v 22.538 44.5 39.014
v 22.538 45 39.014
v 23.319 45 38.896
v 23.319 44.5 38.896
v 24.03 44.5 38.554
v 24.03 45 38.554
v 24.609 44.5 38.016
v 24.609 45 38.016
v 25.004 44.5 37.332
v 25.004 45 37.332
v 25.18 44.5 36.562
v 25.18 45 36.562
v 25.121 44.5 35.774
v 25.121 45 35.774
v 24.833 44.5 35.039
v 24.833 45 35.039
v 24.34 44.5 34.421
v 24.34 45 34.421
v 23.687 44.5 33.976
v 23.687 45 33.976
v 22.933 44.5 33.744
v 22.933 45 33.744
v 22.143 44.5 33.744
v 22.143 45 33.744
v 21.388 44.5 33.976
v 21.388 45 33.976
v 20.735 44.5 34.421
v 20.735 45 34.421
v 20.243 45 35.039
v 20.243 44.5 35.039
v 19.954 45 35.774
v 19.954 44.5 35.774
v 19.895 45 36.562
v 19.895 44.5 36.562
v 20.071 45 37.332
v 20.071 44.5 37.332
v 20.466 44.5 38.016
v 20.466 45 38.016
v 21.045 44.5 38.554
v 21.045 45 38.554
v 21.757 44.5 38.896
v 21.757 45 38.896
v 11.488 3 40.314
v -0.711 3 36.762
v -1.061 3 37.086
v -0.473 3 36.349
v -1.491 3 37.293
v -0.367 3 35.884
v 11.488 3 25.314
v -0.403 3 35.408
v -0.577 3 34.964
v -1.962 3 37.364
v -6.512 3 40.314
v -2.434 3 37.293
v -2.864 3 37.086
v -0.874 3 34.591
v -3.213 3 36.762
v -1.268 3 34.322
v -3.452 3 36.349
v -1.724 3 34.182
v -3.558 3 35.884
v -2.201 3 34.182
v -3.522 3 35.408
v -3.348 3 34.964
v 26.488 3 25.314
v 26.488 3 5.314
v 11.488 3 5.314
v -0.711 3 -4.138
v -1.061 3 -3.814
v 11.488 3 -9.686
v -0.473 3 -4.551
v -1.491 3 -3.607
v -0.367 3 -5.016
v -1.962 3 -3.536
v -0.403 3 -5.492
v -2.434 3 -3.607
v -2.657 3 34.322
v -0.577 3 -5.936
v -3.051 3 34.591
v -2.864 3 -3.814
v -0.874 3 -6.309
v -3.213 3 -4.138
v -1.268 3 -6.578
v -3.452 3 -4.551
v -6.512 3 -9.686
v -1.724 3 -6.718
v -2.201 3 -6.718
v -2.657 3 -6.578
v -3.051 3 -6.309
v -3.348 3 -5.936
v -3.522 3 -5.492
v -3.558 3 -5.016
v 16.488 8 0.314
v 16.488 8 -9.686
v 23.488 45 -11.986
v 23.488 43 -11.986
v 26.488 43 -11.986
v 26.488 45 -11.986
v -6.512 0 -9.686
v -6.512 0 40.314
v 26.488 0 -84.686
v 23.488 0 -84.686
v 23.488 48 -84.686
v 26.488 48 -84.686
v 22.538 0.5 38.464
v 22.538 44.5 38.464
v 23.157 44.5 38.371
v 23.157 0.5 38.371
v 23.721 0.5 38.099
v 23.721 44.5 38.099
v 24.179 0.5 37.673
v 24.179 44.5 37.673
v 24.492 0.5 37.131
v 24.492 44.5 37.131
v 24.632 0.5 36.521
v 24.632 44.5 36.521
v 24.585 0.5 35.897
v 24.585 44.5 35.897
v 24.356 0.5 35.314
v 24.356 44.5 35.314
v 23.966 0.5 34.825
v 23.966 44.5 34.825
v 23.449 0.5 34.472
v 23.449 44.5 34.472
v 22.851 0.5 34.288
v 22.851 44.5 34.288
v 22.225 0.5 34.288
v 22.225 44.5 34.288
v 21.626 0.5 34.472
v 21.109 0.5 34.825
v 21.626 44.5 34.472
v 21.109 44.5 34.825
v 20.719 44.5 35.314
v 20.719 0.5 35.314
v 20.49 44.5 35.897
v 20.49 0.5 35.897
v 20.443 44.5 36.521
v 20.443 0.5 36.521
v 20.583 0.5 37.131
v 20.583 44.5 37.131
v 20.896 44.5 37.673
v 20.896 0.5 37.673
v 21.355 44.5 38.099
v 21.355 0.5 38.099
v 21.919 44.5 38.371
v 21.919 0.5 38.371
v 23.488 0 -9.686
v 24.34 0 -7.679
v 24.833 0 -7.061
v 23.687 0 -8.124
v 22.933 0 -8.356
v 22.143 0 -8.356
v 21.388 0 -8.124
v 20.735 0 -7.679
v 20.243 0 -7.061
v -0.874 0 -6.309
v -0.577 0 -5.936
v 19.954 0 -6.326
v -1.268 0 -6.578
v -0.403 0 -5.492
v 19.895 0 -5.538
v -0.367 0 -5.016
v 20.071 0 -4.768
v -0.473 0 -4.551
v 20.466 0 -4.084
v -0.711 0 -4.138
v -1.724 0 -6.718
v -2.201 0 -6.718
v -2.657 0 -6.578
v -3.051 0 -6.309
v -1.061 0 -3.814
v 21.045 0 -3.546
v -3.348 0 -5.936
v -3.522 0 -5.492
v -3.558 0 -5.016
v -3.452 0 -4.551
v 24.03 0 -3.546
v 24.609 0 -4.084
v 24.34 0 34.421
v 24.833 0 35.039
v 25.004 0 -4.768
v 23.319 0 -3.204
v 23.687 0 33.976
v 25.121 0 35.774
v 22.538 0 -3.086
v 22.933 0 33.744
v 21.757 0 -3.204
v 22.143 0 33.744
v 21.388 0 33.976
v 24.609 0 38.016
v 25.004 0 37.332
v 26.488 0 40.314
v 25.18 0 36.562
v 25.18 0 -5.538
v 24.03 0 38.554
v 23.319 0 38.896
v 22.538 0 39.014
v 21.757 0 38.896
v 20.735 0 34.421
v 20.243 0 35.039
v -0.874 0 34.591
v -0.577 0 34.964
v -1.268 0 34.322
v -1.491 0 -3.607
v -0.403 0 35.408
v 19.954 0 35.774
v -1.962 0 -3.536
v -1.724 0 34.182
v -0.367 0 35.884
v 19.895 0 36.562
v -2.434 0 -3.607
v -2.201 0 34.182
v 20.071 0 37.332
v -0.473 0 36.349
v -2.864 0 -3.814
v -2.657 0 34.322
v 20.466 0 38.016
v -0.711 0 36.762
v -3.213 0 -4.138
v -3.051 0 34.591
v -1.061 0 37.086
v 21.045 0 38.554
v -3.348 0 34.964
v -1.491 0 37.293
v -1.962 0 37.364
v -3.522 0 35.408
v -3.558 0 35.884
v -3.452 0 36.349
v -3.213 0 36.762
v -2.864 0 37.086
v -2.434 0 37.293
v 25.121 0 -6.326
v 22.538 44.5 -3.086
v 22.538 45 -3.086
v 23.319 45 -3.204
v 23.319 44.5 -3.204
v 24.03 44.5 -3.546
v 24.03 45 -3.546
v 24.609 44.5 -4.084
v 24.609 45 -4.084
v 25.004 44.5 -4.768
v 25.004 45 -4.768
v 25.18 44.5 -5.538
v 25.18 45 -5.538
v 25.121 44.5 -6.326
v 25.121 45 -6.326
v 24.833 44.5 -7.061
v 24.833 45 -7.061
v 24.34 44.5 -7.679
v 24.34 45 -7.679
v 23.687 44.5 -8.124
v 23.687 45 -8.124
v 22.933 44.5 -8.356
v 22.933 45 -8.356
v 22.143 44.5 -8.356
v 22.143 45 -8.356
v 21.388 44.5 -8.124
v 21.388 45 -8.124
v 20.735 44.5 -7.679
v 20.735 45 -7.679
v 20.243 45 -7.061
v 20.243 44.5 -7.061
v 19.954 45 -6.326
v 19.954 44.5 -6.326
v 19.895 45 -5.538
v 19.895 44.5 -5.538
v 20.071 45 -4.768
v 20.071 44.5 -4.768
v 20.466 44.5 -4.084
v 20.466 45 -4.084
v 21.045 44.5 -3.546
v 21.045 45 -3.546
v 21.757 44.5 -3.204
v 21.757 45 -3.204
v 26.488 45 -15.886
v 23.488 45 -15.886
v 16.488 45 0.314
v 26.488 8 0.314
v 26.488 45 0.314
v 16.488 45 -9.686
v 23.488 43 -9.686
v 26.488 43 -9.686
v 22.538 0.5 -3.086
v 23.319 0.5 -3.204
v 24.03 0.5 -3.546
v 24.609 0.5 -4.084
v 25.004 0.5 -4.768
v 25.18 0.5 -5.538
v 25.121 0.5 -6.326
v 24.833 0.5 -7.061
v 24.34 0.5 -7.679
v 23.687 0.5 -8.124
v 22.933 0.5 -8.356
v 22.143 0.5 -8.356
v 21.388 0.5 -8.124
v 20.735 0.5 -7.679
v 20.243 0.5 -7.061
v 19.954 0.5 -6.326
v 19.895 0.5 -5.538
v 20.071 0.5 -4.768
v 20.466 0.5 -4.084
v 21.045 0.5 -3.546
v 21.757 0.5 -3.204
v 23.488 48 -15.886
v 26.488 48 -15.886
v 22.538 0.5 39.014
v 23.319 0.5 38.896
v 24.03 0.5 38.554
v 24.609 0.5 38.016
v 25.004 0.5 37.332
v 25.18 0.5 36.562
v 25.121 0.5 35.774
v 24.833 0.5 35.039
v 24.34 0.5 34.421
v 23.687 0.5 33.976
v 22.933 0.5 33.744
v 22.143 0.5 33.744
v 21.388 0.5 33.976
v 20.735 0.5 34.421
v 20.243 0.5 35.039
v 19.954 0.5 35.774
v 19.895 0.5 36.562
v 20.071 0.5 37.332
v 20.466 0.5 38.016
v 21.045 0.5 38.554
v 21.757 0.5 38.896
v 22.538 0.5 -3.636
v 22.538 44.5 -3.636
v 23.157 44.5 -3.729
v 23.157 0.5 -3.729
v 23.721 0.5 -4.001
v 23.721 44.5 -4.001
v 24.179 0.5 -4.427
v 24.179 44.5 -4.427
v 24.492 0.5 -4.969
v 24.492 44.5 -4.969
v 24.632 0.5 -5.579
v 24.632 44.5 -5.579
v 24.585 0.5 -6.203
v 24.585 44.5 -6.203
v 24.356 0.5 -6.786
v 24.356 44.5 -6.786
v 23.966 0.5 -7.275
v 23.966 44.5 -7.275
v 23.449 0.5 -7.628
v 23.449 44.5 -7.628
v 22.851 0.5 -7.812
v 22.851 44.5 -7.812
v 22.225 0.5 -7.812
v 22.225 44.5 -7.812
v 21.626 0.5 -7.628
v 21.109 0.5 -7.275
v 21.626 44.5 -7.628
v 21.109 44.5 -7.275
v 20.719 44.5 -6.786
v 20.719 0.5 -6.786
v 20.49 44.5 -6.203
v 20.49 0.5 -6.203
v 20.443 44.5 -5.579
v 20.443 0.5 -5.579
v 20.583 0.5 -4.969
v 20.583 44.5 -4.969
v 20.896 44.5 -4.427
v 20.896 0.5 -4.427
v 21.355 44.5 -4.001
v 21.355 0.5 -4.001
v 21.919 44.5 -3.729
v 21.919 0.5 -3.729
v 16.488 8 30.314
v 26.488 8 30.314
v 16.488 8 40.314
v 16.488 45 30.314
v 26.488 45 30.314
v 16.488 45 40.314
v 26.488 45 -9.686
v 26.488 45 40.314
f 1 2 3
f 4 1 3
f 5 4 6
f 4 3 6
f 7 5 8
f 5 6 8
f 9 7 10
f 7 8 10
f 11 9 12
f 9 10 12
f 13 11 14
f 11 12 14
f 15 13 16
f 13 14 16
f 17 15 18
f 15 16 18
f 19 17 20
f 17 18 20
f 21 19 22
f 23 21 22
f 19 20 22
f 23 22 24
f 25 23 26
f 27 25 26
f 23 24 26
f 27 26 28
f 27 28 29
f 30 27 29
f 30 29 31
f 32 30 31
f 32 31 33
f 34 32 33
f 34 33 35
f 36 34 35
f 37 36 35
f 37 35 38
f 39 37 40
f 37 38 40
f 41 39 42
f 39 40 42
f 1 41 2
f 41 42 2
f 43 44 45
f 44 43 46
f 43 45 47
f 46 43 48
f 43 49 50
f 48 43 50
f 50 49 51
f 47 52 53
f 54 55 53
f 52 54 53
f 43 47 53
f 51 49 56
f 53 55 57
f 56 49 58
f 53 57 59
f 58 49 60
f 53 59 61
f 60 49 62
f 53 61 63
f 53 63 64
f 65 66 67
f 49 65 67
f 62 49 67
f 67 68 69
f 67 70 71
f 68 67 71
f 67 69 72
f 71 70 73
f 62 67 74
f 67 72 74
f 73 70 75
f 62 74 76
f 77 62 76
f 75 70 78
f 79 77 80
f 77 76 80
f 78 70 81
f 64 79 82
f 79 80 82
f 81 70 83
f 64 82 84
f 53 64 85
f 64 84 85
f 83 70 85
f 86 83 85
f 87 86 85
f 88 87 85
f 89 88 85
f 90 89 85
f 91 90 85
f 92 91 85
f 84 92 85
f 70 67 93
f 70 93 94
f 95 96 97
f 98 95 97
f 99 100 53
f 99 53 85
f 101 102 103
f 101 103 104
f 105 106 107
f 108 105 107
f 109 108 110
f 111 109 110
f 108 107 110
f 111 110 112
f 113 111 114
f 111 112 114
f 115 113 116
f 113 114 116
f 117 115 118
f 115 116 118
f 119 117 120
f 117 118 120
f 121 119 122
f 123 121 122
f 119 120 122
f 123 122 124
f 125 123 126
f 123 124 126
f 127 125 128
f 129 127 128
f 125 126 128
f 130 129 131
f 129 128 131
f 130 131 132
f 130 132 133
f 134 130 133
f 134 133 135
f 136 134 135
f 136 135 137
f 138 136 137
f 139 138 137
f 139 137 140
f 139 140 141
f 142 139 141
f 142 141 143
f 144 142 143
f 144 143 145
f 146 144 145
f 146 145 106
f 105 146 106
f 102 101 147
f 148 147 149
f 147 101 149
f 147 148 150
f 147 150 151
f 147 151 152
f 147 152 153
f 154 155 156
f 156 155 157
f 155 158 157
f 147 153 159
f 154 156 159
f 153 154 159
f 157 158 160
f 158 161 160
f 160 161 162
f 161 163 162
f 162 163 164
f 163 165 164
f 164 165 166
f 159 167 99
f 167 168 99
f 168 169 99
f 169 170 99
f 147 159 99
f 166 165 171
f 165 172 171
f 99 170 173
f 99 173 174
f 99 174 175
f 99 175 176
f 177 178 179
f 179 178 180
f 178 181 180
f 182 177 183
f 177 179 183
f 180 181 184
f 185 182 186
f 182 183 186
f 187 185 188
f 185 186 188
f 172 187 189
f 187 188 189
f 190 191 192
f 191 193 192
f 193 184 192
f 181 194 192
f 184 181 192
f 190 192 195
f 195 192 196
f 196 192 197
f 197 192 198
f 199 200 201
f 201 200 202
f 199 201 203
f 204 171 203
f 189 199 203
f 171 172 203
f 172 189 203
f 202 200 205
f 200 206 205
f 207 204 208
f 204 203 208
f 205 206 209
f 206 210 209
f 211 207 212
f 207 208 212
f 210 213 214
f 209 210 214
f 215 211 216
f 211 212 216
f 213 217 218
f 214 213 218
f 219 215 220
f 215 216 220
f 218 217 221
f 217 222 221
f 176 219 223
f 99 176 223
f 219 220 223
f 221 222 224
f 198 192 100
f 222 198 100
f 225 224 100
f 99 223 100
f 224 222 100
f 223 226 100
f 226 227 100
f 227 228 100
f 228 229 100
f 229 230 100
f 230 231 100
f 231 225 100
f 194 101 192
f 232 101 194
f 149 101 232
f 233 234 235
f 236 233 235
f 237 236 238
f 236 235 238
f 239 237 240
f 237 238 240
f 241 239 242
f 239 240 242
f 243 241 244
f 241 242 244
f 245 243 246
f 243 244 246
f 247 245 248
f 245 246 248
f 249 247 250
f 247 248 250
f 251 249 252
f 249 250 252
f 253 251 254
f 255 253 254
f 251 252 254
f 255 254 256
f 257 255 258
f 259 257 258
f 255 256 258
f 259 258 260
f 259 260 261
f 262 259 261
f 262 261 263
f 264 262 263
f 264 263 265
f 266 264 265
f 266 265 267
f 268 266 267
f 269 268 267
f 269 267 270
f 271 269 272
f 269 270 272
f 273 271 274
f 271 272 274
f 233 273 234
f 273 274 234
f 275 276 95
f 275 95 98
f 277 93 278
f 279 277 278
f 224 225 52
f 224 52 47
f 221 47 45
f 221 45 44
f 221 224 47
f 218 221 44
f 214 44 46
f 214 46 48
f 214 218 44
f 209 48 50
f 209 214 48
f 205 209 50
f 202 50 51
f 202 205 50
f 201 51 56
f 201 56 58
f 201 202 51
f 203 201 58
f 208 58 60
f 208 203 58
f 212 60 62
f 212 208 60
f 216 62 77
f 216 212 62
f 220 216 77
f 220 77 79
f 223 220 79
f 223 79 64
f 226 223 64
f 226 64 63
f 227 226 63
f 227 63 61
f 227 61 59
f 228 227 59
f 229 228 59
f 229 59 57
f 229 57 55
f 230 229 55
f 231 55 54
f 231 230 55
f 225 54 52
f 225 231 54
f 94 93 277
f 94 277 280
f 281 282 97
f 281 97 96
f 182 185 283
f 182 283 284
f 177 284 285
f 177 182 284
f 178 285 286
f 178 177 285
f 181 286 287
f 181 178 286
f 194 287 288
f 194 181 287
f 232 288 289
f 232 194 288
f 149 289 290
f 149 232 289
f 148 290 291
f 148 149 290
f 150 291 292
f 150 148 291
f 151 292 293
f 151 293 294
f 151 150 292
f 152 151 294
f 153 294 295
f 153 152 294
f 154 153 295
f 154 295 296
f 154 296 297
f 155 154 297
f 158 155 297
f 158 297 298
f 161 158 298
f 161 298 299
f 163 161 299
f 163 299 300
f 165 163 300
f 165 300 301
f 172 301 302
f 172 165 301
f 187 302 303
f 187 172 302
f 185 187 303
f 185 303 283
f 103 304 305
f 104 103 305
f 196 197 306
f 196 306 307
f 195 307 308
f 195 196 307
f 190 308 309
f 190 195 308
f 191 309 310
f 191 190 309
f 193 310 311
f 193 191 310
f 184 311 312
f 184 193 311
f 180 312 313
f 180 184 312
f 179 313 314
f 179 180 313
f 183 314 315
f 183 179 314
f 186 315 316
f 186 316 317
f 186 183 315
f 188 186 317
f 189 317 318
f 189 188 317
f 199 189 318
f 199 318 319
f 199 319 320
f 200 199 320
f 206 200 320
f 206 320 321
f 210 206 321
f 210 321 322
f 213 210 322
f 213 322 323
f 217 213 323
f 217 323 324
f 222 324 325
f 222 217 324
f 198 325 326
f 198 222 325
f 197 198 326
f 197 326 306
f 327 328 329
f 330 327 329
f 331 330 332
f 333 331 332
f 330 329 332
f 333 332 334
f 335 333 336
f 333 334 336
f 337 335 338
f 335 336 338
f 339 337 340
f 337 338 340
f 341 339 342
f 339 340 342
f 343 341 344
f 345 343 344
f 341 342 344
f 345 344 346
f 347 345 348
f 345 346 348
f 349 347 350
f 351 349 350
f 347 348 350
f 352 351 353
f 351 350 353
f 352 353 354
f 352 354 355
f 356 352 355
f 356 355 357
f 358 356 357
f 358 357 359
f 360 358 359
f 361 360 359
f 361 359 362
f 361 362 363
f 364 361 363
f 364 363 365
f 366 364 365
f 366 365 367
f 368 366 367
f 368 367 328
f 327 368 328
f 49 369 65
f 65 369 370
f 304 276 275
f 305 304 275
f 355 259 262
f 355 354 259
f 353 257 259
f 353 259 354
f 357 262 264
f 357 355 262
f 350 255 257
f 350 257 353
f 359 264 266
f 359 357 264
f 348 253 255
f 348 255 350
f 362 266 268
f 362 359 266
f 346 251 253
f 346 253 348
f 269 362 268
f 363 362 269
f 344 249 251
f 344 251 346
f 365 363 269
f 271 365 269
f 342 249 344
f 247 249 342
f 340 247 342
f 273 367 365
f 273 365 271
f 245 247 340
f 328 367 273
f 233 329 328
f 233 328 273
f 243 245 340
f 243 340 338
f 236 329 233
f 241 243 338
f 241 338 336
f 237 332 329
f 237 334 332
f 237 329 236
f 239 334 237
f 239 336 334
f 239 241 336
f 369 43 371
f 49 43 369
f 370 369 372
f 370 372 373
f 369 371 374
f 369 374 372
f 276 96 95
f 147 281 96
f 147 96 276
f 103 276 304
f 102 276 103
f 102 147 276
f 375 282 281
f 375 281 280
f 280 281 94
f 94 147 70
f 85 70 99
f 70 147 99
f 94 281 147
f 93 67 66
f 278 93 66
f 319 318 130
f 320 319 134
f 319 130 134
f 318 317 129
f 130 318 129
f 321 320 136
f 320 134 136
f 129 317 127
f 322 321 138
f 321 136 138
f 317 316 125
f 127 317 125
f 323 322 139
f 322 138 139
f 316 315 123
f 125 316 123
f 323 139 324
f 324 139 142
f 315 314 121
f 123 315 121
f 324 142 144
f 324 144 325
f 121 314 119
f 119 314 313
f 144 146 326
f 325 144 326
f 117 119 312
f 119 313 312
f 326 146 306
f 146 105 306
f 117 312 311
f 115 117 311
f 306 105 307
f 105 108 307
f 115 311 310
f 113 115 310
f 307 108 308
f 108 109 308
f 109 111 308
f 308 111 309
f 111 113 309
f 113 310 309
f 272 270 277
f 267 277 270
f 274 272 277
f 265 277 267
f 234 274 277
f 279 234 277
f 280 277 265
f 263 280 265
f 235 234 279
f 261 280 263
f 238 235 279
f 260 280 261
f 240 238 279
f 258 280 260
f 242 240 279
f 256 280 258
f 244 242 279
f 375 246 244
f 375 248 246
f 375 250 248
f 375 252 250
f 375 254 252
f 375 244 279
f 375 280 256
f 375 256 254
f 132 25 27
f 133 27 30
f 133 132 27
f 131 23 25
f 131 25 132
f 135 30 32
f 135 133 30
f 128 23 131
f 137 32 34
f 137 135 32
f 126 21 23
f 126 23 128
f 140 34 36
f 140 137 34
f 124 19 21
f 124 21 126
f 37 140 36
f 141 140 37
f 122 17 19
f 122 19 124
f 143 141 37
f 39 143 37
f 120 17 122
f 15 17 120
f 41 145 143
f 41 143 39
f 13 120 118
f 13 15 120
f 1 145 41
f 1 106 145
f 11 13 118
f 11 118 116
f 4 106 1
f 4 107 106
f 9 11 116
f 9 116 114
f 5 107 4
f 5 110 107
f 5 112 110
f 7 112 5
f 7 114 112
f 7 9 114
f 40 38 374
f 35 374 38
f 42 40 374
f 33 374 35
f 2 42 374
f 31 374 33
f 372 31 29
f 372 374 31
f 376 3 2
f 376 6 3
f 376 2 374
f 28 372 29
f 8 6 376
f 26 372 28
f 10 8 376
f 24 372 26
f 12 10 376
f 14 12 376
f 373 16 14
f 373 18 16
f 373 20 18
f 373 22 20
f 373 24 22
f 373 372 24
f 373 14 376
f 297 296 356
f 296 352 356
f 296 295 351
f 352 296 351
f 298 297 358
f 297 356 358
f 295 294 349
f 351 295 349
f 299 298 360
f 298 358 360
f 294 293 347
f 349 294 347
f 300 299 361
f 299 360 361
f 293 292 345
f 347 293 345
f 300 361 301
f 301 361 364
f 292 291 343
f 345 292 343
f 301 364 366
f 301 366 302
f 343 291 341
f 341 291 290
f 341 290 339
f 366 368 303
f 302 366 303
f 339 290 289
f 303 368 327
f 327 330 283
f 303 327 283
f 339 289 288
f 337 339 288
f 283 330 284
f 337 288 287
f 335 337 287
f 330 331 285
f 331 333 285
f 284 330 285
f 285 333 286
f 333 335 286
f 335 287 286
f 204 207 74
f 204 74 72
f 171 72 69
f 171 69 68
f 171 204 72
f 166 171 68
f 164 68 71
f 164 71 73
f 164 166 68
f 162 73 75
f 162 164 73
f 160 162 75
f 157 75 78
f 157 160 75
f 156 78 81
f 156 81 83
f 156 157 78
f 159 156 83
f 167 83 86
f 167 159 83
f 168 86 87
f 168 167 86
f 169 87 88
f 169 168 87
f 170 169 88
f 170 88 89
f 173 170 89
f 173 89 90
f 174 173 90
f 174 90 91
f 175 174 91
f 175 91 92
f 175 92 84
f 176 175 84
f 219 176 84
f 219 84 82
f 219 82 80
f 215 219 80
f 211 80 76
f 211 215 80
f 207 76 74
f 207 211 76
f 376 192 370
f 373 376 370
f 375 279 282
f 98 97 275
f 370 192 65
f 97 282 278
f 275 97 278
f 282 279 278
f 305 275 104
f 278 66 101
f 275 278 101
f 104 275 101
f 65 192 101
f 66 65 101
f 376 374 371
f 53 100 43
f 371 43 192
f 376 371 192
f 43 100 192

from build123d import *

# Parameters (mm, degrees)
SKETCH1_R           = 1.6
BOSS_EXTRUDE1_DEPTH = 3
SKETCH2_W           = 10
SKETCH2_H           = 10
BOSS_EXTRUDE2_DEPTH = 42
CHAMFER1_SIZE       = 5
SKETCH3_R           = 2.1
CUT_EXTRUDE1_DEPTH  = 52
SKETCH4_R           = 2.65
CUT_EXTRUDE2_DEPTH  = 0.5
SKETCH5_W           = 3
SKETCH5_H           = 43
BOSS_EXTRUDE3_DEPTH = 75
SKETCH6_W           = 3
SKETCH6_H           = 72.7
BOSS_EXTRUDE4_DEPTH = 2
SKETCH7_W           = 3
SKETCH7_H           = 68.8
BOSS_EXTRUDE5_DEPTH = 3


with BuildPart() as part:
    # Sketch1 → Boss-Extrude1 (new body)
    with BuildSketch(Plane(origin=(0, 0, 0), x_dir=(1, 0, 0), z_dir=(0, 1, 0))):
        Polygon((-6.512396694, 9.685950413), (1.487603306, 9.685950413), (26.487603306, 9.685950413), (26.487603306, -40.314049587), (1.487603306, -40.314049587), (-6.512396694, -40.314049587), align=None)
        with Locations(Location((-1.962396694, -35.764049587, 0), (0, 0, 270))):
            Circle(SKETCH1_R, mode=Mode.SUBTRACT)
        with Locations(Location((-1.962396694, 5.135950413, 0), (0, 0, 270))):
            Circle(SKETCH1_R, mode=Mode.SUBTRACT)
    extrude(amount=BOSS_EXTRUDE1_DEPTH)

    # Sketch2 → Boss-Extrude2 (add)
    with BuildSketch(Plane(origin=(0, 3, 0), x_dir=(1, 0, 0), z_dir=(0, 1, 0))):
        with Locations((21.487603306, -35.314049587)):
            Rectangle(SKETCH2_W, SKETCH2_H)
        with Locations((21.487603306, 4.685950413)):
            Rectangle(SKETCH2_W, SKETCH2_H)
    extrude(amount=BOSS_EXTRUDE2_DEPTH)

    # Chamfer1
    chamfer1_edges = [part.edges().sort_by_distance(p)[0] for p in [
        (21.487603306, 3, 30.314049587),
        (16.487603306, 3, 35.314049587),
        (16.487603306, 3, -4.685950413),
        (21.487603306, 3, 0.314049587),
    ]]
    chamfer(chamfer1_edges, length=CHAMFER1_SIZE)

    # Sketch3 → Cut-Extrude1 (cut)
    with BuildSketch(Plane(origin=(0, 45, 0), x_dir=(1, 0, 0), z_dir=(0, 1, 0))):
        with Locations(Location((22.537603306, -36.364049587, 0), (0, 0, 270))):
            Circle(SKETCH3_R)
        with Locations(Location((22.537603306, 5.735950413, 0), (0, 0, 270))):
            Circle(SKETCH3_R)
    extrude(amount=-CUT_EXTRUDE1_DEPTH, mode=Mode.SUBTRACT)

    # Sketch4 → Cut-Extrude2 (cut)
    with BuildSketch(Plane(origin=(0, 45, 0), x_dir=(1, 0, 0), z_dir=(0, 1, 0))):
        with Locations(Location((22.537603306, -36.364049587, 0), (0, 0, 270))):
            Circle(SKETCH4_R)
        with Locations(Location((22.537603306, 5.735950413, 0), (0, 0, 270))):
            Circle(SKETCH4_R)
    cut_extrude2 = extrude(amount=-CUT_EXTRUDE2_DEPTH, mode=Mode.SUBTRACT)

    # Mirror1: Cut-Extrude2 across plane
    add(cut_extrude2.mirror(Plane(origin=(0, 22.5, 0), x_dir=(0, 0, 1), z_dir=(0, -1, 0))), mode=Mode.SUBTRACT)

    # Sketch5 → Boss-Extrude3 (add)
    with BuildSketch(Plane(origin=(0, 0, -9.685950413), x_dir=(-1, 0, 0), z_dir=(0, 0, -1))):
        with Locations((-24.987603306, 21.5)):
            Rectangle(SKETCH5_W, SKETCH5_H)
    extrude(amount=BOSS_EXTRUDE3_DEPTH)

    # Sketch6 → Boss-Extrude4 (add)
    with BuildSketch(Plane(origin=(0, 43, 0), x_dir=(1, 0, 0), z_dir=(0, 1, 0))):
        with Locations((24.987603306, 48.335950413)):
            Rectangle(SKETCH6_W, SKETCH6_H)
    extrude(amount=BOSS_EXTRUDE4_DEPTH)

    # Sketch7 → Boss-Extrude5 (add)
    with BuildSketch(Plane(origin=(0, 45, 0), x_dir=(1, 0, 0), z_dir=(0, 1, 0))):
        with Locations((24.987603306, 50.285950413)):
            Rectangle(SKETCH7_W, SKETCH7_H)
    extrude(amount=BOSS_EXTRUDE5_DEPTH)


solid = part.part
